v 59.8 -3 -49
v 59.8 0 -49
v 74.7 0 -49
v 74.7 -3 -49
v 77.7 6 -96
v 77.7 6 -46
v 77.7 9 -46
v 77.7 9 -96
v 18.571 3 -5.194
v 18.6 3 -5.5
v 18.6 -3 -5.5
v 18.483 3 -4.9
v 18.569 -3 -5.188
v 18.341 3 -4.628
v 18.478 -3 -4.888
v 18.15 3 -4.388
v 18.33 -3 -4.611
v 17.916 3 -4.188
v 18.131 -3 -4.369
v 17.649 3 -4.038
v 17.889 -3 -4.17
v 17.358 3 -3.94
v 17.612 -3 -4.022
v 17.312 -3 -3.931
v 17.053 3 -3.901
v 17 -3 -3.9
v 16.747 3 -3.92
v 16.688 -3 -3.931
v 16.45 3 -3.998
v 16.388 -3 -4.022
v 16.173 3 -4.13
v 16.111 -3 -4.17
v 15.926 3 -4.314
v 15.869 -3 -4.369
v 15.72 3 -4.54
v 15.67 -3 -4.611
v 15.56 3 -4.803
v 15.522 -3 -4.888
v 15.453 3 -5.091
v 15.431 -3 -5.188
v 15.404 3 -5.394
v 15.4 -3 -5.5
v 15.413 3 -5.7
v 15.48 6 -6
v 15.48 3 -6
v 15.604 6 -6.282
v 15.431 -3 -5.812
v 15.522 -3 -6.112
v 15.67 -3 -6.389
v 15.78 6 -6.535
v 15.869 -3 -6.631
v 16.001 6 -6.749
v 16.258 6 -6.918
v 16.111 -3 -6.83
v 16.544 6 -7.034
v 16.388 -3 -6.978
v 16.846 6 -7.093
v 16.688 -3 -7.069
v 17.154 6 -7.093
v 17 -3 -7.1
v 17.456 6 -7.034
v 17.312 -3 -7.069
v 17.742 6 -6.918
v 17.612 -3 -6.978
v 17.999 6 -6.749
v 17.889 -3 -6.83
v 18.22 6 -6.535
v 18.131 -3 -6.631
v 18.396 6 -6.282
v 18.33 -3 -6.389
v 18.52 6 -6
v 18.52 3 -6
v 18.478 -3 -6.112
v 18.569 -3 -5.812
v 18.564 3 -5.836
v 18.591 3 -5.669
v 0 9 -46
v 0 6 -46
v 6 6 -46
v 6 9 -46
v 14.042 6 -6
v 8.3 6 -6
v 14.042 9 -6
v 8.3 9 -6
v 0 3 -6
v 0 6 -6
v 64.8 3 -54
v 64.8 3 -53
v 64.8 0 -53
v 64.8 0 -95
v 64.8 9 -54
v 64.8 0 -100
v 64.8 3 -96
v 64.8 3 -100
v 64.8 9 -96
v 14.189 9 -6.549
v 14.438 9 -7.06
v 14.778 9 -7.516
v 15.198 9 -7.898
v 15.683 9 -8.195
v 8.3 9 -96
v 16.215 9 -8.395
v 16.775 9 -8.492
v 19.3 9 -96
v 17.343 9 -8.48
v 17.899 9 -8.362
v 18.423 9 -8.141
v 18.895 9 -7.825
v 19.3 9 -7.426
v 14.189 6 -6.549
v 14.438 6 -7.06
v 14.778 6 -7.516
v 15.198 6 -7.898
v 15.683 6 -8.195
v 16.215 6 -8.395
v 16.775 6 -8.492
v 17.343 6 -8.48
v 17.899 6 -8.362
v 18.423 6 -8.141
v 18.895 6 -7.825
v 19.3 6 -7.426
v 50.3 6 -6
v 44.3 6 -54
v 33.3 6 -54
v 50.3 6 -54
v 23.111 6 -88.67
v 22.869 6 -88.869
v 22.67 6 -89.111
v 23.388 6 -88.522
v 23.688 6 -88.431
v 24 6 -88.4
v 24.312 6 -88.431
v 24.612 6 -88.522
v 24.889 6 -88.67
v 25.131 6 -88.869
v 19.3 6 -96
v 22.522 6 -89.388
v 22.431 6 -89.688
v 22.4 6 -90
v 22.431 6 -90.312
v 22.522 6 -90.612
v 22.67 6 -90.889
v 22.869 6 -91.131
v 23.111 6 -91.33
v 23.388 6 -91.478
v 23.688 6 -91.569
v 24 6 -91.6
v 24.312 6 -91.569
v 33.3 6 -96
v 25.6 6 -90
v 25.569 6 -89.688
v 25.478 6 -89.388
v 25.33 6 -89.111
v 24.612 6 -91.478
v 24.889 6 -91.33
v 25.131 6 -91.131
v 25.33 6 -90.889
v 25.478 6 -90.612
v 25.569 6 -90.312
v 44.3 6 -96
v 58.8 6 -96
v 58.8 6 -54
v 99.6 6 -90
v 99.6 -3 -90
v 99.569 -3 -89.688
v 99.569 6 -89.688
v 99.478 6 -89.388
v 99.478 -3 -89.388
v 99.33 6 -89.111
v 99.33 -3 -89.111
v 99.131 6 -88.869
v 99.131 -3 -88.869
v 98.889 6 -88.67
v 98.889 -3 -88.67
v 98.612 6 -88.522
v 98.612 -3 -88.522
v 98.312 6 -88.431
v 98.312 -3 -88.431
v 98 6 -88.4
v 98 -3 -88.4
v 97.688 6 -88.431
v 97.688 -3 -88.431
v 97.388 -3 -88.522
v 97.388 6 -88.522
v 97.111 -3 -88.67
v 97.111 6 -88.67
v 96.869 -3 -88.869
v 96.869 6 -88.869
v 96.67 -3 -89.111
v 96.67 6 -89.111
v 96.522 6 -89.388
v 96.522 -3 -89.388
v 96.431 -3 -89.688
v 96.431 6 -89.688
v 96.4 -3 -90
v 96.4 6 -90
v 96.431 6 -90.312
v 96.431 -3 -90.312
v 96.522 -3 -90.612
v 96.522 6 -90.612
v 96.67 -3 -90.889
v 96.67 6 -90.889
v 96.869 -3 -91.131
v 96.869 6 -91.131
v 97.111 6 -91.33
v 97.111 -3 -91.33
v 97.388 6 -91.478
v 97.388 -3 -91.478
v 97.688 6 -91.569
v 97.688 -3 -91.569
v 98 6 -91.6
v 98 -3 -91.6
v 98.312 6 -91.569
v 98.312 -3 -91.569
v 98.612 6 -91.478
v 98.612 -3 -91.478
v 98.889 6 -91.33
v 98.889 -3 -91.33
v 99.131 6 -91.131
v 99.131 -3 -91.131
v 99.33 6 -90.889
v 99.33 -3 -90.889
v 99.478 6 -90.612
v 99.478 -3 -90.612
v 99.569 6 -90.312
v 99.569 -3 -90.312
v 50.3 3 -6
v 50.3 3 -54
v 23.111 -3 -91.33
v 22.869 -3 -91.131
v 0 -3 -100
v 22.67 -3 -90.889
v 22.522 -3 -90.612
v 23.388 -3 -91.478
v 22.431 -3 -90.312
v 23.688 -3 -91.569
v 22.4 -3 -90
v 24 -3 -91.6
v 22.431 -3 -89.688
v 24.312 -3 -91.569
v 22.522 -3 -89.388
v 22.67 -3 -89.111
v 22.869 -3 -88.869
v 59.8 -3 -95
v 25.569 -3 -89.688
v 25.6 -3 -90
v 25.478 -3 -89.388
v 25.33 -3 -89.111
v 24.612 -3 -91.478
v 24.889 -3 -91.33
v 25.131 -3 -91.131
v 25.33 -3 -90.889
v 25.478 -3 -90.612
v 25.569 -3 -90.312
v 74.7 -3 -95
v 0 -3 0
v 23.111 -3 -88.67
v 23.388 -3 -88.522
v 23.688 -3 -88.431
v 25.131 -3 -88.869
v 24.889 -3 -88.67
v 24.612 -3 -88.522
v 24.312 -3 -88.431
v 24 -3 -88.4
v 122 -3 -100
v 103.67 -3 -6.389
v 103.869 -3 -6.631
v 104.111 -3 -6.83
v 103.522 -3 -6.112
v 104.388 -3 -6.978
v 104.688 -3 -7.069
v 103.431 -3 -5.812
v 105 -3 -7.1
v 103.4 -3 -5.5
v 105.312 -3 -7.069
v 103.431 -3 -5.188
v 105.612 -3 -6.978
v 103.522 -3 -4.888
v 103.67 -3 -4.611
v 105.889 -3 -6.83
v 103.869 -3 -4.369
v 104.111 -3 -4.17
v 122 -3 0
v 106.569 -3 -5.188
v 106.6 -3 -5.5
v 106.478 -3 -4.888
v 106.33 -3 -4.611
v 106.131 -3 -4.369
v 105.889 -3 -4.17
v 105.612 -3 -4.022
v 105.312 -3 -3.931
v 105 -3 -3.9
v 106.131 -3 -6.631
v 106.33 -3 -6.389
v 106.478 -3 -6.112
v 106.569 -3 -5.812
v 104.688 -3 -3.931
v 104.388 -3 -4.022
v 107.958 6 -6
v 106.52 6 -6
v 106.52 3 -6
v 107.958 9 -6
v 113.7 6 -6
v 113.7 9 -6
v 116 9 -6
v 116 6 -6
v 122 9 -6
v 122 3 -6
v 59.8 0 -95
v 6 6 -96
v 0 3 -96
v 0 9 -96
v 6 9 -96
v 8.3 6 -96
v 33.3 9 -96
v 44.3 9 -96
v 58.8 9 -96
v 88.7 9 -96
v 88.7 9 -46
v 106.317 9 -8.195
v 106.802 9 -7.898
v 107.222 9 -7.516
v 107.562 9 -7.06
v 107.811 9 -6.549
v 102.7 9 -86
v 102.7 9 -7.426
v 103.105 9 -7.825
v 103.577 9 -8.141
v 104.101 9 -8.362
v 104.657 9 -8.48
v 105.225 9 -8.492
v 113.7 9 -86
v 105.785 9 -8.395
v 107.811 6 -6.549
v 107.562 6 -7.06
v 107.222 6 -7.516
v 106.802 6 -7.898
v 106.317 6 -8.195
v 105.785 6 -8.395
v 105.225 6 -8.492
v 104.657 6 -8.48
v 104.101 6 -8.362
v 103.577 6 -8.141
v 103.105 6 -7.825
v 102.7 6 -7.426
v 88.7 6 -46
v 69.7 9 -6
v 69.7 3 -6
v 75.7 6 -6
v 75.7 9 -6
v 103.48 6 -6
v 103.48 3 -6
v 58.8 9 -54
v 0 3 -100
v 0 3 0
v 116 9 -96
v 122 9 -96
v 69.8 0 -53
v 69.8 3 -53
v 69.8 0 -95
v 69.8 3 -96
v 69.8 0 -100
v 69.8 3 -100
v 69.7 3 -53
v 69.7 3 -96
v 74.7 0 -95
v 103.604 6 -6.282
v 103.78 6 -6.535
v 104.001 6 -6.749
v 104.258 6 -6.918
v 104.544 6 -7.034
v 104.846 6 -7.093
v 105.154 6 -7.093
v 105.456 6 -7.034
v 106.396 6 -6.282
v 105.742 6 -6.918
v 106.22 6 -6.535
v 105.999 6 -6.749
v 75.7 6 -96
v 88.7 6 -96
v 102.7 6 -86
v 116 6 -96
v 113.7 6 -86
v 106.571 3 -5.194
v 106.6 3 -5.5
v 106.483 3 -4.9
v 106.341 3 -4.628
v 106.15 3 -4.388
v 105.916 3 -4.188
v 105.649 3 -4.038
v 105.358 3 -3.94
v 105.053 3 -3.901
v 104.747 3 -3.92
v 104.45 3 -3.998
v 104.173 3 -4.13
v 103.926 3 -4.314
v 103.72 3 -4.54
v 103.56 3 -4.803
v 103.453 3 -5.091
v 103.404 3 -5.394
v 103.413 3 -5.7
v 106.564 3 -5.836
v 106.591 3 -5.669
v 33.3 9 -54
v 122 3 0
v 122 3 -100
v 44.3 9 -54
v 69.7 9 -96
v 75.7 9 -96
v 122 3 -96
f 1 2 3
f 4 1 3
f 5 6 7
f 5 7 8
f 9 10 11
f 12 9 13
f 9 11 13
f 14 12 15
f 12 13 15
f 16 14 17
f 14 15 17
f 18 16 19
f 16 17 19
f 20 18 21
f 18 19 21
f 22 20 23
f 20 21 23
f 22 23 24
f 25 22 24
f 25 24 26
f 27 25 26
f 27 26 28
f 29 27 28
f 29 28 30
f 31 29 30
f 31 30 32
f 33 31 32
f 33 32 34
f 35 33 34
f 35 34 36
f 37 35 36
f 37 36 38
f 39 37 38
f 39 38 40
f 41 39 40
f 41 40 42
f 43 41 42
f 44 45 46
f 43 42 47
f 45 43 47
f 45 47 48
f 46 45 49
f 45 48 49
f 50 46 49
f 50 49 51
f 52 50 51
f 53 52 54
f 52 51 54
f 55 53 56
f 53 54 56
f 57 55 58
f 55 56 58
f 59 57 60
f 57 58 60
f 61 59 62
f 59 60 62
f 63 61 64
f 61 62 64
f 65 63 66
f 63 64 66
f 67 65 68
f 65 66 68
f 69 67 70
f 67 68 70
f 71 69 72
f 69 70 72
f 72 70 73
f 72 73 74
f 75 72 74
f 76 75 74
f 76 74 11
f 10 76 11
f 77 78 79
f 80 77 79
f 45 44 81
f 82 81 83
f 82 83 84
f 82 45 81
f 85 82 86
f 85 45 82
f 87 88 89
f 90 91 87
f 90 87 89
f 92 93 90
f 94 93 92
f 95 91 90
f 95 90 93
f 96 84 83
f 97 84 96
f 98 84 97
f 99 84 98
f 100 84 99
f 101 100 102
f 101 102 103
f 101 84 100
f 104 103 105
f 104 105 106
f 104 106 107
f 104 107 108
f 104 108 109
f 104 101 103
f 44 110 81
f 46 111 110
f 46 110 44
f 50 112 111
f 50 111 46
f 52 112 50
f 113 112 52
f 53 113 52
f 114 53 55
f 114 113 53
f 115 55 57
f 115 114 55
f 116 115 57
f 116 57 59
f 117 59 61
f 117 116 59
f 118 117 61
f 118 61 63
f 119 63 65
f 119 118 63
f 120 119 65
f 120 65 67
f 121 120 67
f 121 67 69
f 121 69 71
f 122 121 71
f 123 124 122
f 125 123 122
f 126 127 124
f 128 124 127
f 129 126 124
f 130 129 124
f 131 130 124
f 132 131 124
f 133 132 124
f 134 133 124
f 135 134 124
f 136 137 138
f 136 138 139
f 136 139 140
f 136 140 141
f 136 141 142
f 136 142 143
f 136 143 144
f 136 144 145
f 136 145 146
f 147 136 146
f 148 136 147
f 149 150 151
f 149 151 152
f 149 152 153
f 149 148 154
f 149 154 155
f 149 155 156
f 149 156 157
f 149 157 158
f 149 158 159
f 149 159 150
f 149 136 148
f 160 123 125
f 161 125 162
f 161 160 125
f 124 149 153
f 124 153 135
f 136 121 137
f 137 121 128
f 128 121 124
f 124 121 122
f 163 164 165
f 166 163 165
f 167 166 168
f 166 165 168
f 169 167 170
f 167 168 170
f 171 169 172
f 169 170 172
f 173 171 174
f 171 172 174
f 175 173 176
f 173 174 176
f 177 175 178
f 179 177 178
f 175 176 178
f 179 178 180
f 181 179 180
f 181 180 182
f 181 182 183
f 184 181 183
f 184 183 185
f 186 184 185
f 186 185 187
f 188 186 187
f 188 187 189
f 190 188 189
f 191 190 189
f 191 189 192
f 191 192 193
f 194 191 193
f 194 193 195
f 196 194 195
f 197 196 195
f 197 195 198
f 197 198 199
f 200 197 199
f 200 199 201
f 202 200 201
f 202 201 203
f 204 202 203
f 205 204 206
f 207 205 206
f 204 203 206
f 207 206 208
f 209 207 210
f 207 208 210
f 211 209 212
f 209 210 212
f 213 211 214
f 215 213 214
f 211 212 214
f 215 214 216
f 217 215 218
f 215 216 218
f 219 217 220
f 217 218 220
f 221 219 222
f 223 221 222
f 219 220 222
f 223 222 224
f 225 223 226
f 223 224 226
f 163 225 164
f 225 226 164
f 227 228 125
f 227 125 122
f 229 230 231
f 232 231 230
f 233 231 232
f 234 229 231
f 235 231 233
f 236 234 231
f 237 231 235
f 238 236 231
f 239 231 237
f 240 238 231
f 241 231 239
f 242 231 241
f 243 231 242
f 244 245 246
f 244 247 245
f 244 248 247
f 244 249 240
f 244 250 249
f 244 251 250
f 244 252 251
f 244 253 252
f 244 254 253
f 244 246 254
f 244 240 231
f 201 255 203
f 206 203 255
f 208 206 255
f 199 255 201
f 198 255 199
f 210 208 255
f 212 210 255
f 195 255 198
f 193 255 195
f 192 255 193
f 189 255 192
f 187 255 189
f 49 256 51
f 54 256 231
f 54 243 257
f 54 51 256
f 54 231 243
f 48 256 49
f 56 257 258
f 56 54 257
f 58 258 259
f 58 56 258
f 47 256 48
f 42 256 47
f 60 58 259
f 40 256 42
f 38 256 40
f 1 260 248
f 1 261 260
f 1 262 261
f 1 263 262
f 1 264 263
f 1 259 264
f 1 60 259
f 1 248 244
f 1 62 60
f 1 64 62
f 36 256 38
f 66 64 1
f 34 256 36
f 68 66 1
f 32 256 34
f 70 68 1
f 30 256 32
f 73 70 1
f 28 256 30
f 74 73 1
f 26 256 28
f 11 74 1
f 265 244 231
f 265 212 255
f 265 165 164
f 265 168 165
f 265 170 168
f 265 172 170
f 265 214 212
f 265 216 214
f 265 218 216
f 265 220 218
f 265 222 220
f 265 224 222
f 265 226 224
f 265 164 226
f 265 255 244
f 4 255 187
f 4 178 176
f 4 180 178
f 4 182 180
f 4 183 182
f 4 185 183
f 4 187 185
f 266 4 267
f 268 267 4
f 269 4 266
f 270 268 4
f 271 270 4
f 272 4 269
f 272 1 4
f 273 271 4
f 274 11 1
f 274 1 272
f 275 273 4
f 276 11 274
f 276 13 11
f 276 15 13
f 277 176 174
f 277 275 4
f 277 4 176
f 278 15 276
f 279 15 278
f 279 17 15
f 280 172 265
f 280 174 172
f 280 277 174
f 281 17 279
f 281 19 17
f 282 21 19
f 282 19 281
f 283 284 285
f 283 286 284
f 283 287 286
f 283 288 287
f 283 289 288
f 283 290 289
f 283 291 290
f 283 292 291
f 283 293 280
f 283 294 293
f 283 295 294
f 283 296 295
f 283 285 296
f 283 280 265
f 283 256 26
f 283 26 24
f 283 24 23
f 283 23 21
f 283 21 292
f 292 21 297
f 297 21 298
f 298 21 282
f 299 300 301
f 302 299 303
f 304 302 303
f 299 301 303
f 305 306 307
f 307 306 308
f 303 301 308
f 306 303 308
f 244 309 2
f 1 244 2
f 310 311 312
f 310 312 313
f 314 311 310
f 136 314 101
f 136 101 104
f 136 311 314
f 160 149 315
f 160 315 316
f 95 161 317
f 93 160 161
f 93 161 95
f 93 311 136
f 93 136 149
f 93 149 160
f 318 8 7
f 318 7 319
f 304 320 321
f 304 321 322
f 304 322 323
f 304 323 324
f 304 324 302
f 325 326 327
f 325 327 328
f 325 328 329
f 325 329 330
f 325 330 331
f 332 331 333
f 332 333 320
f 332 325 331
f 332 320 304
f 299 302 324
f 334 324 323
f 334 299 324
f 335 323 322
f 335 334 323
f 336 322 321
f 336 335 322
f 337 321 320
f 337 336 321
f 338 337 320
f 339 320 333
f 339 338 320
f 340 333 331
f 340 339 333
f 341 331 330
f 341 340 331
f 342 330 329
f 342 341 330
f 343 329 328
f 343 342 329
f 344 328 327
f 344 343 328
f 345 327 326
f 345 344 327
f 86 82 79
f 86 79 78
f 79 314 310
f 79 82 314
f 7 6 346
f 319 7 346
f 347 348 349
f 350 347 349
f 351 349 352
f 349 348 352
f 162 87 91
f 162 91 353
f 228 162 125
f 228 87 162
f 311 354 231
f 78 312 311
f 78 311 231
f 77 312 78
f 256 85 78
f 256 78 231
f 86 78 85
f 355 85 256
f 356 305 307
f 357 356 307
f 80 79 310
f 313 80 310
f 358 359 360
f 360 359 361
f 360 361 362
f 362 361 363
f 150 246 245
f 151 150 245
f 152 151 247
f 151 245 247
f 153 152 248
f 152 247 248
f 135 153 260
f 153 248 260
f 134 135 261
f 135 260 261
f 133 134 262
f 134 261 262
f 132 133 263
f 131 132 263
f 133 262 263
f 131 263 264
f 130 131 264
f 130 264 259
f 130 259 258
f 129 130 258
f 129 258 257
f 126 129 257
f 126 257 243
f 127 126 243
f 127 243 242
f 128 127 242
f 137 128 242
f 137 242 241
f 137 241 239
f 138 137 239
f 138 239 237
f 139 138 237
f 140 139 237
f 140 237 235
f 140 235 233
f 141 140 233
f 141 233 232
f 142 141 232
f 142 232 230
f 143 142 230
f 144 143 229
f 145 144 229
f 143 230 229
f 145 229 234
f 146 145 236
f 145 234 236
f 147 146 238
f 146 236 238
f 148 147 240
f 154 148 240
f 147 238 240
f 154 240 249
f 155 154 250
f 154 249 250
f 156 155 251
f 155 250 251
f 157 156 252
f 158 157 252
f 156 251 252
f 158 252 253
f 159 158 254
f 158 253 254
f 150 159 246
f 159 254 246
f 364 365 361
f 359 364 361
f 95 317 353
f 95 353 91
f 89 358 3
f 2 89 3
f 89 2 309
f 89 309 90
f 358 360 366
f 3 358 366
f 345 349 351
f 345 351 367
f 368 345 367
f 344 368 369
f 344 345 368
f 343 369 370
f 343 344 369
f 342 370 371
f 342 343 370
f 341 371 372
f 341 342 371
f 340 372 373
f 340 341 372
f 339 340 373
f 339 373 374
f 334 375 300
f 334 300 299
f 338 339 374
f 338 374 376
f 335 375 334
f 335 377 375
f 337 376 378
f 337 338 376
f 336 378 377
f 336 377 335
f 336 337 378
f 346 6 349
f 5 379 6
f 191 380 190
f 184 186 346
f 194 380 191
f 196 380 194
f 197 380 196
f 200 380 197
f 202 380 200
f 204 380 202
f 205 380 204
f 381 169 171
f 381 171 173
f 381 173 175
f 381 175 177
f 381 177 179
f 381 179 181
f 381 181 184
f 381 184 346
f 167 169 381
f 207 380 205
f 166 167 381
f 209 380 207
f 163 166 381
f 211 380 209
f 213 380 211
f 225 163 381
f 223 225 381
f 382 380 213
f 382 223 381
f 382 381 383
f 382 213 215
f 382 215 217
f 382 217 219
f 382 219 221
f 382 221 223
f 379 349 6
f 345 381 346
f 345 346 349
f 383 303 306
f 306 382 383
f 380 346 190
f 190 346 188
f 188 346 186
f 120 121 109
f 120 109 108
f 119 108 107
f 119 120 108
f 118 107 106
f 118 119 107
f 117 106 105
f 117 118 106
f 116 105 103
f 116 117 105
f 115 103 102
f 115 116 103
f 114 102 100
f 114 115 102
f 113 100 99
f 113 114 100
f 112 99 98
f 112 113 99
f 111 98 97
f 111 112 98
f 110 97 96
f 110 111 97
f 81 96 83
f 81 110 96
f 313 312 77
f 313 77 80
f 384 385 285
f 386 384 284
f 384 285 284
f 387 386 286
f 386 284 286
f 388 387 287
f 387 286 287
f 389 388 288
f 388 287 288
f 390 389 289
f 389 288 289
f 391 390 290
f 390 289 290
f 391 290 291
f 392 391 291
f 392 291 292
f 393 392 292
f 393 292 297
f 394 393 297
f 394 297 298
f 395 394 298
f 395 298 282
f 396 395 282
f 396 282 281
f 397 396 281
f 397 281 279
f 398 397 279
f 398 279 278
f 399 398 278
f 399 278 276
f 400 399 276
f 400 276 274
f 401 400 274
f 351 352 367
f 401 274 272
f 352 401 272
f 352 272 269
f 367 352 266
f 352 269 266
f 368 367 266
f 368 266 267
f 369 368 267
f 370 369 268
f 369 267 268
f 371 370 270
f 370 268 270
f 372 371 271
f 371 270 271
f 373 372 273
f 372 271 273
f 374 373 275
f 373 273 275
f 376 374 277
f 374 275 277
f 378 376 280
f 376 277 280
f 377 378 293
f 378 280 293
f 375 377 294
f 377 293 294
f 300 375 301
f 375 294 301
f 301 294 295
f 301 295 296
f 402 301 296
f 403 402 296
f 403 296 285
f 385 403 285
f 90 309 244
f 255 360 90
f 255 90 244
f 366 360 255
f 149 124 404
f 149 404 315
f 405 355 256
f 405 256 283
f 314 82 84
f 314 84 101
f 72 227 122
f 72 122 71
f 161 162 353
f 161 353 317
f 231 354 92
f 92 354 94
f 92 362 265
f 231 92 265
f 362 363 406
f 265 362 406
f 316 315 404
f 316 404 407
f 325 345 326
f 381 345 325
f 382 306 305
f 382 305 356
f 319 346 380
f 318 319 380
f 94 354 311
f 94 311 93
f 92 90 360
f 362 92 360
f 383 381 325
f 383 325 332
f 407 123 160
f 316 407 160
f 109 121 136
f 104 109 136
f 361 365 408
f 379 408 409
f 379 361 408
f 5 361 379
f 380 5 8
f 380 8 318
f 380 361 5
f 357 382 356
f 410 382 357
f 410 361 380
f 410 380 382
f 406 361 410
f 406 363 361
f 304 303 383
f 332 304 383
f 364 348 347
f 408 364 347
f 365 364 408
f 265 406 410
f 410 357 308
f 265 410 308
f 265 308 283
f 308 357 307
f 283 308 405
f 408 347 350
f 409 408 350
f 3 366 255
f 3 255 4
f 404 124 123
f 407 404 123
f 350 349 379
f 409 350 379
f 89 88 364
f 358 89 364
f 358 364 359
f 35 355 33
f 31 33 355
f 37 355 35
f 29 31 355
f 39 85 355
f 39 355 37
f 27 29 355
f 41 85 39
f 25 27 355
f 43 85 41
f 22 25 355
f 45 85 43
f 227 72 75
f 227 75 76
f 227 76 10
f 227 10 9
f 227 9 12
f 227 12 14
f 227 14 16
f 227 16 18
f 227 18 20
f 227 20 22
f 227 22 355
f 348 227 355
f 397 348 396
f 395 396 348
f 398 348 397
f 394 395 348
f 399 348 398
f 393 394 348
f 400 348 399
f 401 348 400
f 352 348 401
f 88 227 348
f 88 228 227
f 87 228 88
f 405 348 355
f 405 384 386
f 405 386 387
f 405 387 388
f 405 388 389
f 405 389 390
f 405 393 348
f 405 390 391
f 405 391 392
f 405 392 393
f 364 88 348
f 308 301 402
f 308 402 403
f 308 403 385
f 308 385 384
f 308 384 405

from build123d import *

# Parameters (mm, degrees)
SKETCH1_W           = 122
SKETCH1_H           = 100
BOSS_EXTRUDE1_DEPTH = 3
SKETCH2_W           = 5
SKETCH2_H           = 47
CUT_EXTRUDE1_DEPTH  = 4
SKETCH3_W           = 52.3
SKETCH3_H           = 90
BOSS_EXTRUDE2_DEPTH = 3
SKETCH4_W           = 6
SKETCH4_H           = 50
SKETCH4_W_2         = 11
SKETCH4_H_2         = 90
SKETCH4_H_3         = 42
SKETCH4_H_4         = 80
BOSS_EXTRUDE3_DEPTH = 3
SKETCH7_W           = 122
SKETCH7_H           = 100
SKETCH7_W_2         = 14.9
SKETCH7_H_2         = 46
BOSS_EXTRUDE5_DEPTH = 3
SKETCH8_R           = 1.6
CUT_EXTRUDE2_DEPTH  = 13
CUT_EXTRUDE3_START  = 3
SKETCH9_R           = 3
CUT_EXTRUDE3_DEPTH  = 4


with BuildPart() as part:
    # Sketch1 → Boss-Extrude1 (new body)
    with BuildSketch(Plane(origin=(0, 0, 0), x_dir=(1, 0, 0), z_dir=(0, 1, 0))):
        with Locations((61, 50)):
            Rectangle(SKETCH1_W, SKETCH1_H)
    extrude(amount=BOSS_EXTRUDE1_DEPTH)

    # Sketch2 → Cut-Extrude1 (cut, through all)
    with BuildSketch(Plane(origin=(0, 3, 0), x_dir=(1, 0, 0), z_dir=(0, 1, 0))):
        with Locations((67.3, 76.5)):
            Rectangle(SKETCH2_W, SKETCH2_H)
    extrude(amount=-CUT_EXTRUDE1_DEPTH, mode=Mode.SUBTRACT)

    # Sketch3 → Boss-Extrude2 (add)
    with BuildSketch(Plane(origin=(0, 3, 0), x_dir=(1, 0, 0), z_dir=(0, 1, 0))):
        Polygon((0, 96), (64.8, 96), (64.8, 54), (50.3, 54), (50.3, 6), (0, 6), align=None)
        with Locations((95.85, 51)):
            Rectangle(SKETCH3_W, SKETCH3_H)
    extrude(amount=BOSS_EXTRUDE2_DEPTH)

    # Sketch4 → Boss-Extrude3 (add)
    with BuildSketch(Plane(origin=(0, 6, 0), x_dir=(1, 0, 0), z_dir=(0, 1, 0))):
        with Locations((3, 71)):
            Rectangle(SKETCH4_W, SKETCH4_H)
        with Locations((13.8, 51)):
            Rectangle(SKETCH4_W_2, SKETCH4_H_2)
        with Locations((38.8, 75)):
            Rectangle(SKETCH4_W_2, SKETCH4_H_3)
        with Locations((61.8, 75)):
            Rectangle(SKETCH4_W, SKETCH4_H_3)
        with Locations((83.2, 71)):
            Rectangle(SKETCH4_W_2, SKETCH4_H)
        with Locations((108.2, 46)):
            Rectangle(SKETCH4_W_2, SKETCH4_H_4)
        with Locations((119, 51)):
            Rectangle(SKETCH4_W, SKETCH4_H_2)
        with Locations((72.7, 51)):
            Rectangle(SKETCH4_W, SKETCH4_H_2)
    extrude(amount=BOSS_EXTRUDE3_DEPTH)

    # Sketch7 → Boss-Extrude5 (add)
    with BuildSketch(Plane.XZ):
        with Locations((61, -50)):
            Rectangle(SKETCH7_W, SKETCH7_H)
        with Locations((67.25, -72)):
            Rectangle(SKETCH7_W_2, SKETCH7_H_2, mode=Mode.SUBTRACT)
    extrude(amount=BOSS_EXTRUDE5_DEPTH)

    # Sketch8 → Cut-Extrude2 (cut, through all)
    with BuildSketch(Plane.XZ.offset(3)):
        with Locations((105, -5.5)):
            Circle(SKETCH8_R)
        with Locations((17, -5.5)):
            Circle(SKETCH8_R)
        with Locations((24, -90)):
            Circle(SKETCH8_R)
        with Locations((98, -90)):
            Circle(SKETCH8_R)
    extrude(amount=-CUT_EXTRUDE2_DEPTH, mode=Mode.SUBTRACT)

    # Sketch9 → Cut-Extrude3 (cut, through all)
    with BuildSketch(Plane(origin=(0, 3, 0), x_dir=(1, 0, 0), z_dir=(0, 1, 0)).offset(CUT_EXTRUDE3_START)):
        with Locations((17, 5.5)):
            Circle(SKETCH9_R)
        with Locations((105, 5.5)):
            Circle(SKETCH9_R)
    extrude(amount=CUT_EXTRUDE3_DEPTH, mode=Mode.SUBTRACT)


solid = part.part
